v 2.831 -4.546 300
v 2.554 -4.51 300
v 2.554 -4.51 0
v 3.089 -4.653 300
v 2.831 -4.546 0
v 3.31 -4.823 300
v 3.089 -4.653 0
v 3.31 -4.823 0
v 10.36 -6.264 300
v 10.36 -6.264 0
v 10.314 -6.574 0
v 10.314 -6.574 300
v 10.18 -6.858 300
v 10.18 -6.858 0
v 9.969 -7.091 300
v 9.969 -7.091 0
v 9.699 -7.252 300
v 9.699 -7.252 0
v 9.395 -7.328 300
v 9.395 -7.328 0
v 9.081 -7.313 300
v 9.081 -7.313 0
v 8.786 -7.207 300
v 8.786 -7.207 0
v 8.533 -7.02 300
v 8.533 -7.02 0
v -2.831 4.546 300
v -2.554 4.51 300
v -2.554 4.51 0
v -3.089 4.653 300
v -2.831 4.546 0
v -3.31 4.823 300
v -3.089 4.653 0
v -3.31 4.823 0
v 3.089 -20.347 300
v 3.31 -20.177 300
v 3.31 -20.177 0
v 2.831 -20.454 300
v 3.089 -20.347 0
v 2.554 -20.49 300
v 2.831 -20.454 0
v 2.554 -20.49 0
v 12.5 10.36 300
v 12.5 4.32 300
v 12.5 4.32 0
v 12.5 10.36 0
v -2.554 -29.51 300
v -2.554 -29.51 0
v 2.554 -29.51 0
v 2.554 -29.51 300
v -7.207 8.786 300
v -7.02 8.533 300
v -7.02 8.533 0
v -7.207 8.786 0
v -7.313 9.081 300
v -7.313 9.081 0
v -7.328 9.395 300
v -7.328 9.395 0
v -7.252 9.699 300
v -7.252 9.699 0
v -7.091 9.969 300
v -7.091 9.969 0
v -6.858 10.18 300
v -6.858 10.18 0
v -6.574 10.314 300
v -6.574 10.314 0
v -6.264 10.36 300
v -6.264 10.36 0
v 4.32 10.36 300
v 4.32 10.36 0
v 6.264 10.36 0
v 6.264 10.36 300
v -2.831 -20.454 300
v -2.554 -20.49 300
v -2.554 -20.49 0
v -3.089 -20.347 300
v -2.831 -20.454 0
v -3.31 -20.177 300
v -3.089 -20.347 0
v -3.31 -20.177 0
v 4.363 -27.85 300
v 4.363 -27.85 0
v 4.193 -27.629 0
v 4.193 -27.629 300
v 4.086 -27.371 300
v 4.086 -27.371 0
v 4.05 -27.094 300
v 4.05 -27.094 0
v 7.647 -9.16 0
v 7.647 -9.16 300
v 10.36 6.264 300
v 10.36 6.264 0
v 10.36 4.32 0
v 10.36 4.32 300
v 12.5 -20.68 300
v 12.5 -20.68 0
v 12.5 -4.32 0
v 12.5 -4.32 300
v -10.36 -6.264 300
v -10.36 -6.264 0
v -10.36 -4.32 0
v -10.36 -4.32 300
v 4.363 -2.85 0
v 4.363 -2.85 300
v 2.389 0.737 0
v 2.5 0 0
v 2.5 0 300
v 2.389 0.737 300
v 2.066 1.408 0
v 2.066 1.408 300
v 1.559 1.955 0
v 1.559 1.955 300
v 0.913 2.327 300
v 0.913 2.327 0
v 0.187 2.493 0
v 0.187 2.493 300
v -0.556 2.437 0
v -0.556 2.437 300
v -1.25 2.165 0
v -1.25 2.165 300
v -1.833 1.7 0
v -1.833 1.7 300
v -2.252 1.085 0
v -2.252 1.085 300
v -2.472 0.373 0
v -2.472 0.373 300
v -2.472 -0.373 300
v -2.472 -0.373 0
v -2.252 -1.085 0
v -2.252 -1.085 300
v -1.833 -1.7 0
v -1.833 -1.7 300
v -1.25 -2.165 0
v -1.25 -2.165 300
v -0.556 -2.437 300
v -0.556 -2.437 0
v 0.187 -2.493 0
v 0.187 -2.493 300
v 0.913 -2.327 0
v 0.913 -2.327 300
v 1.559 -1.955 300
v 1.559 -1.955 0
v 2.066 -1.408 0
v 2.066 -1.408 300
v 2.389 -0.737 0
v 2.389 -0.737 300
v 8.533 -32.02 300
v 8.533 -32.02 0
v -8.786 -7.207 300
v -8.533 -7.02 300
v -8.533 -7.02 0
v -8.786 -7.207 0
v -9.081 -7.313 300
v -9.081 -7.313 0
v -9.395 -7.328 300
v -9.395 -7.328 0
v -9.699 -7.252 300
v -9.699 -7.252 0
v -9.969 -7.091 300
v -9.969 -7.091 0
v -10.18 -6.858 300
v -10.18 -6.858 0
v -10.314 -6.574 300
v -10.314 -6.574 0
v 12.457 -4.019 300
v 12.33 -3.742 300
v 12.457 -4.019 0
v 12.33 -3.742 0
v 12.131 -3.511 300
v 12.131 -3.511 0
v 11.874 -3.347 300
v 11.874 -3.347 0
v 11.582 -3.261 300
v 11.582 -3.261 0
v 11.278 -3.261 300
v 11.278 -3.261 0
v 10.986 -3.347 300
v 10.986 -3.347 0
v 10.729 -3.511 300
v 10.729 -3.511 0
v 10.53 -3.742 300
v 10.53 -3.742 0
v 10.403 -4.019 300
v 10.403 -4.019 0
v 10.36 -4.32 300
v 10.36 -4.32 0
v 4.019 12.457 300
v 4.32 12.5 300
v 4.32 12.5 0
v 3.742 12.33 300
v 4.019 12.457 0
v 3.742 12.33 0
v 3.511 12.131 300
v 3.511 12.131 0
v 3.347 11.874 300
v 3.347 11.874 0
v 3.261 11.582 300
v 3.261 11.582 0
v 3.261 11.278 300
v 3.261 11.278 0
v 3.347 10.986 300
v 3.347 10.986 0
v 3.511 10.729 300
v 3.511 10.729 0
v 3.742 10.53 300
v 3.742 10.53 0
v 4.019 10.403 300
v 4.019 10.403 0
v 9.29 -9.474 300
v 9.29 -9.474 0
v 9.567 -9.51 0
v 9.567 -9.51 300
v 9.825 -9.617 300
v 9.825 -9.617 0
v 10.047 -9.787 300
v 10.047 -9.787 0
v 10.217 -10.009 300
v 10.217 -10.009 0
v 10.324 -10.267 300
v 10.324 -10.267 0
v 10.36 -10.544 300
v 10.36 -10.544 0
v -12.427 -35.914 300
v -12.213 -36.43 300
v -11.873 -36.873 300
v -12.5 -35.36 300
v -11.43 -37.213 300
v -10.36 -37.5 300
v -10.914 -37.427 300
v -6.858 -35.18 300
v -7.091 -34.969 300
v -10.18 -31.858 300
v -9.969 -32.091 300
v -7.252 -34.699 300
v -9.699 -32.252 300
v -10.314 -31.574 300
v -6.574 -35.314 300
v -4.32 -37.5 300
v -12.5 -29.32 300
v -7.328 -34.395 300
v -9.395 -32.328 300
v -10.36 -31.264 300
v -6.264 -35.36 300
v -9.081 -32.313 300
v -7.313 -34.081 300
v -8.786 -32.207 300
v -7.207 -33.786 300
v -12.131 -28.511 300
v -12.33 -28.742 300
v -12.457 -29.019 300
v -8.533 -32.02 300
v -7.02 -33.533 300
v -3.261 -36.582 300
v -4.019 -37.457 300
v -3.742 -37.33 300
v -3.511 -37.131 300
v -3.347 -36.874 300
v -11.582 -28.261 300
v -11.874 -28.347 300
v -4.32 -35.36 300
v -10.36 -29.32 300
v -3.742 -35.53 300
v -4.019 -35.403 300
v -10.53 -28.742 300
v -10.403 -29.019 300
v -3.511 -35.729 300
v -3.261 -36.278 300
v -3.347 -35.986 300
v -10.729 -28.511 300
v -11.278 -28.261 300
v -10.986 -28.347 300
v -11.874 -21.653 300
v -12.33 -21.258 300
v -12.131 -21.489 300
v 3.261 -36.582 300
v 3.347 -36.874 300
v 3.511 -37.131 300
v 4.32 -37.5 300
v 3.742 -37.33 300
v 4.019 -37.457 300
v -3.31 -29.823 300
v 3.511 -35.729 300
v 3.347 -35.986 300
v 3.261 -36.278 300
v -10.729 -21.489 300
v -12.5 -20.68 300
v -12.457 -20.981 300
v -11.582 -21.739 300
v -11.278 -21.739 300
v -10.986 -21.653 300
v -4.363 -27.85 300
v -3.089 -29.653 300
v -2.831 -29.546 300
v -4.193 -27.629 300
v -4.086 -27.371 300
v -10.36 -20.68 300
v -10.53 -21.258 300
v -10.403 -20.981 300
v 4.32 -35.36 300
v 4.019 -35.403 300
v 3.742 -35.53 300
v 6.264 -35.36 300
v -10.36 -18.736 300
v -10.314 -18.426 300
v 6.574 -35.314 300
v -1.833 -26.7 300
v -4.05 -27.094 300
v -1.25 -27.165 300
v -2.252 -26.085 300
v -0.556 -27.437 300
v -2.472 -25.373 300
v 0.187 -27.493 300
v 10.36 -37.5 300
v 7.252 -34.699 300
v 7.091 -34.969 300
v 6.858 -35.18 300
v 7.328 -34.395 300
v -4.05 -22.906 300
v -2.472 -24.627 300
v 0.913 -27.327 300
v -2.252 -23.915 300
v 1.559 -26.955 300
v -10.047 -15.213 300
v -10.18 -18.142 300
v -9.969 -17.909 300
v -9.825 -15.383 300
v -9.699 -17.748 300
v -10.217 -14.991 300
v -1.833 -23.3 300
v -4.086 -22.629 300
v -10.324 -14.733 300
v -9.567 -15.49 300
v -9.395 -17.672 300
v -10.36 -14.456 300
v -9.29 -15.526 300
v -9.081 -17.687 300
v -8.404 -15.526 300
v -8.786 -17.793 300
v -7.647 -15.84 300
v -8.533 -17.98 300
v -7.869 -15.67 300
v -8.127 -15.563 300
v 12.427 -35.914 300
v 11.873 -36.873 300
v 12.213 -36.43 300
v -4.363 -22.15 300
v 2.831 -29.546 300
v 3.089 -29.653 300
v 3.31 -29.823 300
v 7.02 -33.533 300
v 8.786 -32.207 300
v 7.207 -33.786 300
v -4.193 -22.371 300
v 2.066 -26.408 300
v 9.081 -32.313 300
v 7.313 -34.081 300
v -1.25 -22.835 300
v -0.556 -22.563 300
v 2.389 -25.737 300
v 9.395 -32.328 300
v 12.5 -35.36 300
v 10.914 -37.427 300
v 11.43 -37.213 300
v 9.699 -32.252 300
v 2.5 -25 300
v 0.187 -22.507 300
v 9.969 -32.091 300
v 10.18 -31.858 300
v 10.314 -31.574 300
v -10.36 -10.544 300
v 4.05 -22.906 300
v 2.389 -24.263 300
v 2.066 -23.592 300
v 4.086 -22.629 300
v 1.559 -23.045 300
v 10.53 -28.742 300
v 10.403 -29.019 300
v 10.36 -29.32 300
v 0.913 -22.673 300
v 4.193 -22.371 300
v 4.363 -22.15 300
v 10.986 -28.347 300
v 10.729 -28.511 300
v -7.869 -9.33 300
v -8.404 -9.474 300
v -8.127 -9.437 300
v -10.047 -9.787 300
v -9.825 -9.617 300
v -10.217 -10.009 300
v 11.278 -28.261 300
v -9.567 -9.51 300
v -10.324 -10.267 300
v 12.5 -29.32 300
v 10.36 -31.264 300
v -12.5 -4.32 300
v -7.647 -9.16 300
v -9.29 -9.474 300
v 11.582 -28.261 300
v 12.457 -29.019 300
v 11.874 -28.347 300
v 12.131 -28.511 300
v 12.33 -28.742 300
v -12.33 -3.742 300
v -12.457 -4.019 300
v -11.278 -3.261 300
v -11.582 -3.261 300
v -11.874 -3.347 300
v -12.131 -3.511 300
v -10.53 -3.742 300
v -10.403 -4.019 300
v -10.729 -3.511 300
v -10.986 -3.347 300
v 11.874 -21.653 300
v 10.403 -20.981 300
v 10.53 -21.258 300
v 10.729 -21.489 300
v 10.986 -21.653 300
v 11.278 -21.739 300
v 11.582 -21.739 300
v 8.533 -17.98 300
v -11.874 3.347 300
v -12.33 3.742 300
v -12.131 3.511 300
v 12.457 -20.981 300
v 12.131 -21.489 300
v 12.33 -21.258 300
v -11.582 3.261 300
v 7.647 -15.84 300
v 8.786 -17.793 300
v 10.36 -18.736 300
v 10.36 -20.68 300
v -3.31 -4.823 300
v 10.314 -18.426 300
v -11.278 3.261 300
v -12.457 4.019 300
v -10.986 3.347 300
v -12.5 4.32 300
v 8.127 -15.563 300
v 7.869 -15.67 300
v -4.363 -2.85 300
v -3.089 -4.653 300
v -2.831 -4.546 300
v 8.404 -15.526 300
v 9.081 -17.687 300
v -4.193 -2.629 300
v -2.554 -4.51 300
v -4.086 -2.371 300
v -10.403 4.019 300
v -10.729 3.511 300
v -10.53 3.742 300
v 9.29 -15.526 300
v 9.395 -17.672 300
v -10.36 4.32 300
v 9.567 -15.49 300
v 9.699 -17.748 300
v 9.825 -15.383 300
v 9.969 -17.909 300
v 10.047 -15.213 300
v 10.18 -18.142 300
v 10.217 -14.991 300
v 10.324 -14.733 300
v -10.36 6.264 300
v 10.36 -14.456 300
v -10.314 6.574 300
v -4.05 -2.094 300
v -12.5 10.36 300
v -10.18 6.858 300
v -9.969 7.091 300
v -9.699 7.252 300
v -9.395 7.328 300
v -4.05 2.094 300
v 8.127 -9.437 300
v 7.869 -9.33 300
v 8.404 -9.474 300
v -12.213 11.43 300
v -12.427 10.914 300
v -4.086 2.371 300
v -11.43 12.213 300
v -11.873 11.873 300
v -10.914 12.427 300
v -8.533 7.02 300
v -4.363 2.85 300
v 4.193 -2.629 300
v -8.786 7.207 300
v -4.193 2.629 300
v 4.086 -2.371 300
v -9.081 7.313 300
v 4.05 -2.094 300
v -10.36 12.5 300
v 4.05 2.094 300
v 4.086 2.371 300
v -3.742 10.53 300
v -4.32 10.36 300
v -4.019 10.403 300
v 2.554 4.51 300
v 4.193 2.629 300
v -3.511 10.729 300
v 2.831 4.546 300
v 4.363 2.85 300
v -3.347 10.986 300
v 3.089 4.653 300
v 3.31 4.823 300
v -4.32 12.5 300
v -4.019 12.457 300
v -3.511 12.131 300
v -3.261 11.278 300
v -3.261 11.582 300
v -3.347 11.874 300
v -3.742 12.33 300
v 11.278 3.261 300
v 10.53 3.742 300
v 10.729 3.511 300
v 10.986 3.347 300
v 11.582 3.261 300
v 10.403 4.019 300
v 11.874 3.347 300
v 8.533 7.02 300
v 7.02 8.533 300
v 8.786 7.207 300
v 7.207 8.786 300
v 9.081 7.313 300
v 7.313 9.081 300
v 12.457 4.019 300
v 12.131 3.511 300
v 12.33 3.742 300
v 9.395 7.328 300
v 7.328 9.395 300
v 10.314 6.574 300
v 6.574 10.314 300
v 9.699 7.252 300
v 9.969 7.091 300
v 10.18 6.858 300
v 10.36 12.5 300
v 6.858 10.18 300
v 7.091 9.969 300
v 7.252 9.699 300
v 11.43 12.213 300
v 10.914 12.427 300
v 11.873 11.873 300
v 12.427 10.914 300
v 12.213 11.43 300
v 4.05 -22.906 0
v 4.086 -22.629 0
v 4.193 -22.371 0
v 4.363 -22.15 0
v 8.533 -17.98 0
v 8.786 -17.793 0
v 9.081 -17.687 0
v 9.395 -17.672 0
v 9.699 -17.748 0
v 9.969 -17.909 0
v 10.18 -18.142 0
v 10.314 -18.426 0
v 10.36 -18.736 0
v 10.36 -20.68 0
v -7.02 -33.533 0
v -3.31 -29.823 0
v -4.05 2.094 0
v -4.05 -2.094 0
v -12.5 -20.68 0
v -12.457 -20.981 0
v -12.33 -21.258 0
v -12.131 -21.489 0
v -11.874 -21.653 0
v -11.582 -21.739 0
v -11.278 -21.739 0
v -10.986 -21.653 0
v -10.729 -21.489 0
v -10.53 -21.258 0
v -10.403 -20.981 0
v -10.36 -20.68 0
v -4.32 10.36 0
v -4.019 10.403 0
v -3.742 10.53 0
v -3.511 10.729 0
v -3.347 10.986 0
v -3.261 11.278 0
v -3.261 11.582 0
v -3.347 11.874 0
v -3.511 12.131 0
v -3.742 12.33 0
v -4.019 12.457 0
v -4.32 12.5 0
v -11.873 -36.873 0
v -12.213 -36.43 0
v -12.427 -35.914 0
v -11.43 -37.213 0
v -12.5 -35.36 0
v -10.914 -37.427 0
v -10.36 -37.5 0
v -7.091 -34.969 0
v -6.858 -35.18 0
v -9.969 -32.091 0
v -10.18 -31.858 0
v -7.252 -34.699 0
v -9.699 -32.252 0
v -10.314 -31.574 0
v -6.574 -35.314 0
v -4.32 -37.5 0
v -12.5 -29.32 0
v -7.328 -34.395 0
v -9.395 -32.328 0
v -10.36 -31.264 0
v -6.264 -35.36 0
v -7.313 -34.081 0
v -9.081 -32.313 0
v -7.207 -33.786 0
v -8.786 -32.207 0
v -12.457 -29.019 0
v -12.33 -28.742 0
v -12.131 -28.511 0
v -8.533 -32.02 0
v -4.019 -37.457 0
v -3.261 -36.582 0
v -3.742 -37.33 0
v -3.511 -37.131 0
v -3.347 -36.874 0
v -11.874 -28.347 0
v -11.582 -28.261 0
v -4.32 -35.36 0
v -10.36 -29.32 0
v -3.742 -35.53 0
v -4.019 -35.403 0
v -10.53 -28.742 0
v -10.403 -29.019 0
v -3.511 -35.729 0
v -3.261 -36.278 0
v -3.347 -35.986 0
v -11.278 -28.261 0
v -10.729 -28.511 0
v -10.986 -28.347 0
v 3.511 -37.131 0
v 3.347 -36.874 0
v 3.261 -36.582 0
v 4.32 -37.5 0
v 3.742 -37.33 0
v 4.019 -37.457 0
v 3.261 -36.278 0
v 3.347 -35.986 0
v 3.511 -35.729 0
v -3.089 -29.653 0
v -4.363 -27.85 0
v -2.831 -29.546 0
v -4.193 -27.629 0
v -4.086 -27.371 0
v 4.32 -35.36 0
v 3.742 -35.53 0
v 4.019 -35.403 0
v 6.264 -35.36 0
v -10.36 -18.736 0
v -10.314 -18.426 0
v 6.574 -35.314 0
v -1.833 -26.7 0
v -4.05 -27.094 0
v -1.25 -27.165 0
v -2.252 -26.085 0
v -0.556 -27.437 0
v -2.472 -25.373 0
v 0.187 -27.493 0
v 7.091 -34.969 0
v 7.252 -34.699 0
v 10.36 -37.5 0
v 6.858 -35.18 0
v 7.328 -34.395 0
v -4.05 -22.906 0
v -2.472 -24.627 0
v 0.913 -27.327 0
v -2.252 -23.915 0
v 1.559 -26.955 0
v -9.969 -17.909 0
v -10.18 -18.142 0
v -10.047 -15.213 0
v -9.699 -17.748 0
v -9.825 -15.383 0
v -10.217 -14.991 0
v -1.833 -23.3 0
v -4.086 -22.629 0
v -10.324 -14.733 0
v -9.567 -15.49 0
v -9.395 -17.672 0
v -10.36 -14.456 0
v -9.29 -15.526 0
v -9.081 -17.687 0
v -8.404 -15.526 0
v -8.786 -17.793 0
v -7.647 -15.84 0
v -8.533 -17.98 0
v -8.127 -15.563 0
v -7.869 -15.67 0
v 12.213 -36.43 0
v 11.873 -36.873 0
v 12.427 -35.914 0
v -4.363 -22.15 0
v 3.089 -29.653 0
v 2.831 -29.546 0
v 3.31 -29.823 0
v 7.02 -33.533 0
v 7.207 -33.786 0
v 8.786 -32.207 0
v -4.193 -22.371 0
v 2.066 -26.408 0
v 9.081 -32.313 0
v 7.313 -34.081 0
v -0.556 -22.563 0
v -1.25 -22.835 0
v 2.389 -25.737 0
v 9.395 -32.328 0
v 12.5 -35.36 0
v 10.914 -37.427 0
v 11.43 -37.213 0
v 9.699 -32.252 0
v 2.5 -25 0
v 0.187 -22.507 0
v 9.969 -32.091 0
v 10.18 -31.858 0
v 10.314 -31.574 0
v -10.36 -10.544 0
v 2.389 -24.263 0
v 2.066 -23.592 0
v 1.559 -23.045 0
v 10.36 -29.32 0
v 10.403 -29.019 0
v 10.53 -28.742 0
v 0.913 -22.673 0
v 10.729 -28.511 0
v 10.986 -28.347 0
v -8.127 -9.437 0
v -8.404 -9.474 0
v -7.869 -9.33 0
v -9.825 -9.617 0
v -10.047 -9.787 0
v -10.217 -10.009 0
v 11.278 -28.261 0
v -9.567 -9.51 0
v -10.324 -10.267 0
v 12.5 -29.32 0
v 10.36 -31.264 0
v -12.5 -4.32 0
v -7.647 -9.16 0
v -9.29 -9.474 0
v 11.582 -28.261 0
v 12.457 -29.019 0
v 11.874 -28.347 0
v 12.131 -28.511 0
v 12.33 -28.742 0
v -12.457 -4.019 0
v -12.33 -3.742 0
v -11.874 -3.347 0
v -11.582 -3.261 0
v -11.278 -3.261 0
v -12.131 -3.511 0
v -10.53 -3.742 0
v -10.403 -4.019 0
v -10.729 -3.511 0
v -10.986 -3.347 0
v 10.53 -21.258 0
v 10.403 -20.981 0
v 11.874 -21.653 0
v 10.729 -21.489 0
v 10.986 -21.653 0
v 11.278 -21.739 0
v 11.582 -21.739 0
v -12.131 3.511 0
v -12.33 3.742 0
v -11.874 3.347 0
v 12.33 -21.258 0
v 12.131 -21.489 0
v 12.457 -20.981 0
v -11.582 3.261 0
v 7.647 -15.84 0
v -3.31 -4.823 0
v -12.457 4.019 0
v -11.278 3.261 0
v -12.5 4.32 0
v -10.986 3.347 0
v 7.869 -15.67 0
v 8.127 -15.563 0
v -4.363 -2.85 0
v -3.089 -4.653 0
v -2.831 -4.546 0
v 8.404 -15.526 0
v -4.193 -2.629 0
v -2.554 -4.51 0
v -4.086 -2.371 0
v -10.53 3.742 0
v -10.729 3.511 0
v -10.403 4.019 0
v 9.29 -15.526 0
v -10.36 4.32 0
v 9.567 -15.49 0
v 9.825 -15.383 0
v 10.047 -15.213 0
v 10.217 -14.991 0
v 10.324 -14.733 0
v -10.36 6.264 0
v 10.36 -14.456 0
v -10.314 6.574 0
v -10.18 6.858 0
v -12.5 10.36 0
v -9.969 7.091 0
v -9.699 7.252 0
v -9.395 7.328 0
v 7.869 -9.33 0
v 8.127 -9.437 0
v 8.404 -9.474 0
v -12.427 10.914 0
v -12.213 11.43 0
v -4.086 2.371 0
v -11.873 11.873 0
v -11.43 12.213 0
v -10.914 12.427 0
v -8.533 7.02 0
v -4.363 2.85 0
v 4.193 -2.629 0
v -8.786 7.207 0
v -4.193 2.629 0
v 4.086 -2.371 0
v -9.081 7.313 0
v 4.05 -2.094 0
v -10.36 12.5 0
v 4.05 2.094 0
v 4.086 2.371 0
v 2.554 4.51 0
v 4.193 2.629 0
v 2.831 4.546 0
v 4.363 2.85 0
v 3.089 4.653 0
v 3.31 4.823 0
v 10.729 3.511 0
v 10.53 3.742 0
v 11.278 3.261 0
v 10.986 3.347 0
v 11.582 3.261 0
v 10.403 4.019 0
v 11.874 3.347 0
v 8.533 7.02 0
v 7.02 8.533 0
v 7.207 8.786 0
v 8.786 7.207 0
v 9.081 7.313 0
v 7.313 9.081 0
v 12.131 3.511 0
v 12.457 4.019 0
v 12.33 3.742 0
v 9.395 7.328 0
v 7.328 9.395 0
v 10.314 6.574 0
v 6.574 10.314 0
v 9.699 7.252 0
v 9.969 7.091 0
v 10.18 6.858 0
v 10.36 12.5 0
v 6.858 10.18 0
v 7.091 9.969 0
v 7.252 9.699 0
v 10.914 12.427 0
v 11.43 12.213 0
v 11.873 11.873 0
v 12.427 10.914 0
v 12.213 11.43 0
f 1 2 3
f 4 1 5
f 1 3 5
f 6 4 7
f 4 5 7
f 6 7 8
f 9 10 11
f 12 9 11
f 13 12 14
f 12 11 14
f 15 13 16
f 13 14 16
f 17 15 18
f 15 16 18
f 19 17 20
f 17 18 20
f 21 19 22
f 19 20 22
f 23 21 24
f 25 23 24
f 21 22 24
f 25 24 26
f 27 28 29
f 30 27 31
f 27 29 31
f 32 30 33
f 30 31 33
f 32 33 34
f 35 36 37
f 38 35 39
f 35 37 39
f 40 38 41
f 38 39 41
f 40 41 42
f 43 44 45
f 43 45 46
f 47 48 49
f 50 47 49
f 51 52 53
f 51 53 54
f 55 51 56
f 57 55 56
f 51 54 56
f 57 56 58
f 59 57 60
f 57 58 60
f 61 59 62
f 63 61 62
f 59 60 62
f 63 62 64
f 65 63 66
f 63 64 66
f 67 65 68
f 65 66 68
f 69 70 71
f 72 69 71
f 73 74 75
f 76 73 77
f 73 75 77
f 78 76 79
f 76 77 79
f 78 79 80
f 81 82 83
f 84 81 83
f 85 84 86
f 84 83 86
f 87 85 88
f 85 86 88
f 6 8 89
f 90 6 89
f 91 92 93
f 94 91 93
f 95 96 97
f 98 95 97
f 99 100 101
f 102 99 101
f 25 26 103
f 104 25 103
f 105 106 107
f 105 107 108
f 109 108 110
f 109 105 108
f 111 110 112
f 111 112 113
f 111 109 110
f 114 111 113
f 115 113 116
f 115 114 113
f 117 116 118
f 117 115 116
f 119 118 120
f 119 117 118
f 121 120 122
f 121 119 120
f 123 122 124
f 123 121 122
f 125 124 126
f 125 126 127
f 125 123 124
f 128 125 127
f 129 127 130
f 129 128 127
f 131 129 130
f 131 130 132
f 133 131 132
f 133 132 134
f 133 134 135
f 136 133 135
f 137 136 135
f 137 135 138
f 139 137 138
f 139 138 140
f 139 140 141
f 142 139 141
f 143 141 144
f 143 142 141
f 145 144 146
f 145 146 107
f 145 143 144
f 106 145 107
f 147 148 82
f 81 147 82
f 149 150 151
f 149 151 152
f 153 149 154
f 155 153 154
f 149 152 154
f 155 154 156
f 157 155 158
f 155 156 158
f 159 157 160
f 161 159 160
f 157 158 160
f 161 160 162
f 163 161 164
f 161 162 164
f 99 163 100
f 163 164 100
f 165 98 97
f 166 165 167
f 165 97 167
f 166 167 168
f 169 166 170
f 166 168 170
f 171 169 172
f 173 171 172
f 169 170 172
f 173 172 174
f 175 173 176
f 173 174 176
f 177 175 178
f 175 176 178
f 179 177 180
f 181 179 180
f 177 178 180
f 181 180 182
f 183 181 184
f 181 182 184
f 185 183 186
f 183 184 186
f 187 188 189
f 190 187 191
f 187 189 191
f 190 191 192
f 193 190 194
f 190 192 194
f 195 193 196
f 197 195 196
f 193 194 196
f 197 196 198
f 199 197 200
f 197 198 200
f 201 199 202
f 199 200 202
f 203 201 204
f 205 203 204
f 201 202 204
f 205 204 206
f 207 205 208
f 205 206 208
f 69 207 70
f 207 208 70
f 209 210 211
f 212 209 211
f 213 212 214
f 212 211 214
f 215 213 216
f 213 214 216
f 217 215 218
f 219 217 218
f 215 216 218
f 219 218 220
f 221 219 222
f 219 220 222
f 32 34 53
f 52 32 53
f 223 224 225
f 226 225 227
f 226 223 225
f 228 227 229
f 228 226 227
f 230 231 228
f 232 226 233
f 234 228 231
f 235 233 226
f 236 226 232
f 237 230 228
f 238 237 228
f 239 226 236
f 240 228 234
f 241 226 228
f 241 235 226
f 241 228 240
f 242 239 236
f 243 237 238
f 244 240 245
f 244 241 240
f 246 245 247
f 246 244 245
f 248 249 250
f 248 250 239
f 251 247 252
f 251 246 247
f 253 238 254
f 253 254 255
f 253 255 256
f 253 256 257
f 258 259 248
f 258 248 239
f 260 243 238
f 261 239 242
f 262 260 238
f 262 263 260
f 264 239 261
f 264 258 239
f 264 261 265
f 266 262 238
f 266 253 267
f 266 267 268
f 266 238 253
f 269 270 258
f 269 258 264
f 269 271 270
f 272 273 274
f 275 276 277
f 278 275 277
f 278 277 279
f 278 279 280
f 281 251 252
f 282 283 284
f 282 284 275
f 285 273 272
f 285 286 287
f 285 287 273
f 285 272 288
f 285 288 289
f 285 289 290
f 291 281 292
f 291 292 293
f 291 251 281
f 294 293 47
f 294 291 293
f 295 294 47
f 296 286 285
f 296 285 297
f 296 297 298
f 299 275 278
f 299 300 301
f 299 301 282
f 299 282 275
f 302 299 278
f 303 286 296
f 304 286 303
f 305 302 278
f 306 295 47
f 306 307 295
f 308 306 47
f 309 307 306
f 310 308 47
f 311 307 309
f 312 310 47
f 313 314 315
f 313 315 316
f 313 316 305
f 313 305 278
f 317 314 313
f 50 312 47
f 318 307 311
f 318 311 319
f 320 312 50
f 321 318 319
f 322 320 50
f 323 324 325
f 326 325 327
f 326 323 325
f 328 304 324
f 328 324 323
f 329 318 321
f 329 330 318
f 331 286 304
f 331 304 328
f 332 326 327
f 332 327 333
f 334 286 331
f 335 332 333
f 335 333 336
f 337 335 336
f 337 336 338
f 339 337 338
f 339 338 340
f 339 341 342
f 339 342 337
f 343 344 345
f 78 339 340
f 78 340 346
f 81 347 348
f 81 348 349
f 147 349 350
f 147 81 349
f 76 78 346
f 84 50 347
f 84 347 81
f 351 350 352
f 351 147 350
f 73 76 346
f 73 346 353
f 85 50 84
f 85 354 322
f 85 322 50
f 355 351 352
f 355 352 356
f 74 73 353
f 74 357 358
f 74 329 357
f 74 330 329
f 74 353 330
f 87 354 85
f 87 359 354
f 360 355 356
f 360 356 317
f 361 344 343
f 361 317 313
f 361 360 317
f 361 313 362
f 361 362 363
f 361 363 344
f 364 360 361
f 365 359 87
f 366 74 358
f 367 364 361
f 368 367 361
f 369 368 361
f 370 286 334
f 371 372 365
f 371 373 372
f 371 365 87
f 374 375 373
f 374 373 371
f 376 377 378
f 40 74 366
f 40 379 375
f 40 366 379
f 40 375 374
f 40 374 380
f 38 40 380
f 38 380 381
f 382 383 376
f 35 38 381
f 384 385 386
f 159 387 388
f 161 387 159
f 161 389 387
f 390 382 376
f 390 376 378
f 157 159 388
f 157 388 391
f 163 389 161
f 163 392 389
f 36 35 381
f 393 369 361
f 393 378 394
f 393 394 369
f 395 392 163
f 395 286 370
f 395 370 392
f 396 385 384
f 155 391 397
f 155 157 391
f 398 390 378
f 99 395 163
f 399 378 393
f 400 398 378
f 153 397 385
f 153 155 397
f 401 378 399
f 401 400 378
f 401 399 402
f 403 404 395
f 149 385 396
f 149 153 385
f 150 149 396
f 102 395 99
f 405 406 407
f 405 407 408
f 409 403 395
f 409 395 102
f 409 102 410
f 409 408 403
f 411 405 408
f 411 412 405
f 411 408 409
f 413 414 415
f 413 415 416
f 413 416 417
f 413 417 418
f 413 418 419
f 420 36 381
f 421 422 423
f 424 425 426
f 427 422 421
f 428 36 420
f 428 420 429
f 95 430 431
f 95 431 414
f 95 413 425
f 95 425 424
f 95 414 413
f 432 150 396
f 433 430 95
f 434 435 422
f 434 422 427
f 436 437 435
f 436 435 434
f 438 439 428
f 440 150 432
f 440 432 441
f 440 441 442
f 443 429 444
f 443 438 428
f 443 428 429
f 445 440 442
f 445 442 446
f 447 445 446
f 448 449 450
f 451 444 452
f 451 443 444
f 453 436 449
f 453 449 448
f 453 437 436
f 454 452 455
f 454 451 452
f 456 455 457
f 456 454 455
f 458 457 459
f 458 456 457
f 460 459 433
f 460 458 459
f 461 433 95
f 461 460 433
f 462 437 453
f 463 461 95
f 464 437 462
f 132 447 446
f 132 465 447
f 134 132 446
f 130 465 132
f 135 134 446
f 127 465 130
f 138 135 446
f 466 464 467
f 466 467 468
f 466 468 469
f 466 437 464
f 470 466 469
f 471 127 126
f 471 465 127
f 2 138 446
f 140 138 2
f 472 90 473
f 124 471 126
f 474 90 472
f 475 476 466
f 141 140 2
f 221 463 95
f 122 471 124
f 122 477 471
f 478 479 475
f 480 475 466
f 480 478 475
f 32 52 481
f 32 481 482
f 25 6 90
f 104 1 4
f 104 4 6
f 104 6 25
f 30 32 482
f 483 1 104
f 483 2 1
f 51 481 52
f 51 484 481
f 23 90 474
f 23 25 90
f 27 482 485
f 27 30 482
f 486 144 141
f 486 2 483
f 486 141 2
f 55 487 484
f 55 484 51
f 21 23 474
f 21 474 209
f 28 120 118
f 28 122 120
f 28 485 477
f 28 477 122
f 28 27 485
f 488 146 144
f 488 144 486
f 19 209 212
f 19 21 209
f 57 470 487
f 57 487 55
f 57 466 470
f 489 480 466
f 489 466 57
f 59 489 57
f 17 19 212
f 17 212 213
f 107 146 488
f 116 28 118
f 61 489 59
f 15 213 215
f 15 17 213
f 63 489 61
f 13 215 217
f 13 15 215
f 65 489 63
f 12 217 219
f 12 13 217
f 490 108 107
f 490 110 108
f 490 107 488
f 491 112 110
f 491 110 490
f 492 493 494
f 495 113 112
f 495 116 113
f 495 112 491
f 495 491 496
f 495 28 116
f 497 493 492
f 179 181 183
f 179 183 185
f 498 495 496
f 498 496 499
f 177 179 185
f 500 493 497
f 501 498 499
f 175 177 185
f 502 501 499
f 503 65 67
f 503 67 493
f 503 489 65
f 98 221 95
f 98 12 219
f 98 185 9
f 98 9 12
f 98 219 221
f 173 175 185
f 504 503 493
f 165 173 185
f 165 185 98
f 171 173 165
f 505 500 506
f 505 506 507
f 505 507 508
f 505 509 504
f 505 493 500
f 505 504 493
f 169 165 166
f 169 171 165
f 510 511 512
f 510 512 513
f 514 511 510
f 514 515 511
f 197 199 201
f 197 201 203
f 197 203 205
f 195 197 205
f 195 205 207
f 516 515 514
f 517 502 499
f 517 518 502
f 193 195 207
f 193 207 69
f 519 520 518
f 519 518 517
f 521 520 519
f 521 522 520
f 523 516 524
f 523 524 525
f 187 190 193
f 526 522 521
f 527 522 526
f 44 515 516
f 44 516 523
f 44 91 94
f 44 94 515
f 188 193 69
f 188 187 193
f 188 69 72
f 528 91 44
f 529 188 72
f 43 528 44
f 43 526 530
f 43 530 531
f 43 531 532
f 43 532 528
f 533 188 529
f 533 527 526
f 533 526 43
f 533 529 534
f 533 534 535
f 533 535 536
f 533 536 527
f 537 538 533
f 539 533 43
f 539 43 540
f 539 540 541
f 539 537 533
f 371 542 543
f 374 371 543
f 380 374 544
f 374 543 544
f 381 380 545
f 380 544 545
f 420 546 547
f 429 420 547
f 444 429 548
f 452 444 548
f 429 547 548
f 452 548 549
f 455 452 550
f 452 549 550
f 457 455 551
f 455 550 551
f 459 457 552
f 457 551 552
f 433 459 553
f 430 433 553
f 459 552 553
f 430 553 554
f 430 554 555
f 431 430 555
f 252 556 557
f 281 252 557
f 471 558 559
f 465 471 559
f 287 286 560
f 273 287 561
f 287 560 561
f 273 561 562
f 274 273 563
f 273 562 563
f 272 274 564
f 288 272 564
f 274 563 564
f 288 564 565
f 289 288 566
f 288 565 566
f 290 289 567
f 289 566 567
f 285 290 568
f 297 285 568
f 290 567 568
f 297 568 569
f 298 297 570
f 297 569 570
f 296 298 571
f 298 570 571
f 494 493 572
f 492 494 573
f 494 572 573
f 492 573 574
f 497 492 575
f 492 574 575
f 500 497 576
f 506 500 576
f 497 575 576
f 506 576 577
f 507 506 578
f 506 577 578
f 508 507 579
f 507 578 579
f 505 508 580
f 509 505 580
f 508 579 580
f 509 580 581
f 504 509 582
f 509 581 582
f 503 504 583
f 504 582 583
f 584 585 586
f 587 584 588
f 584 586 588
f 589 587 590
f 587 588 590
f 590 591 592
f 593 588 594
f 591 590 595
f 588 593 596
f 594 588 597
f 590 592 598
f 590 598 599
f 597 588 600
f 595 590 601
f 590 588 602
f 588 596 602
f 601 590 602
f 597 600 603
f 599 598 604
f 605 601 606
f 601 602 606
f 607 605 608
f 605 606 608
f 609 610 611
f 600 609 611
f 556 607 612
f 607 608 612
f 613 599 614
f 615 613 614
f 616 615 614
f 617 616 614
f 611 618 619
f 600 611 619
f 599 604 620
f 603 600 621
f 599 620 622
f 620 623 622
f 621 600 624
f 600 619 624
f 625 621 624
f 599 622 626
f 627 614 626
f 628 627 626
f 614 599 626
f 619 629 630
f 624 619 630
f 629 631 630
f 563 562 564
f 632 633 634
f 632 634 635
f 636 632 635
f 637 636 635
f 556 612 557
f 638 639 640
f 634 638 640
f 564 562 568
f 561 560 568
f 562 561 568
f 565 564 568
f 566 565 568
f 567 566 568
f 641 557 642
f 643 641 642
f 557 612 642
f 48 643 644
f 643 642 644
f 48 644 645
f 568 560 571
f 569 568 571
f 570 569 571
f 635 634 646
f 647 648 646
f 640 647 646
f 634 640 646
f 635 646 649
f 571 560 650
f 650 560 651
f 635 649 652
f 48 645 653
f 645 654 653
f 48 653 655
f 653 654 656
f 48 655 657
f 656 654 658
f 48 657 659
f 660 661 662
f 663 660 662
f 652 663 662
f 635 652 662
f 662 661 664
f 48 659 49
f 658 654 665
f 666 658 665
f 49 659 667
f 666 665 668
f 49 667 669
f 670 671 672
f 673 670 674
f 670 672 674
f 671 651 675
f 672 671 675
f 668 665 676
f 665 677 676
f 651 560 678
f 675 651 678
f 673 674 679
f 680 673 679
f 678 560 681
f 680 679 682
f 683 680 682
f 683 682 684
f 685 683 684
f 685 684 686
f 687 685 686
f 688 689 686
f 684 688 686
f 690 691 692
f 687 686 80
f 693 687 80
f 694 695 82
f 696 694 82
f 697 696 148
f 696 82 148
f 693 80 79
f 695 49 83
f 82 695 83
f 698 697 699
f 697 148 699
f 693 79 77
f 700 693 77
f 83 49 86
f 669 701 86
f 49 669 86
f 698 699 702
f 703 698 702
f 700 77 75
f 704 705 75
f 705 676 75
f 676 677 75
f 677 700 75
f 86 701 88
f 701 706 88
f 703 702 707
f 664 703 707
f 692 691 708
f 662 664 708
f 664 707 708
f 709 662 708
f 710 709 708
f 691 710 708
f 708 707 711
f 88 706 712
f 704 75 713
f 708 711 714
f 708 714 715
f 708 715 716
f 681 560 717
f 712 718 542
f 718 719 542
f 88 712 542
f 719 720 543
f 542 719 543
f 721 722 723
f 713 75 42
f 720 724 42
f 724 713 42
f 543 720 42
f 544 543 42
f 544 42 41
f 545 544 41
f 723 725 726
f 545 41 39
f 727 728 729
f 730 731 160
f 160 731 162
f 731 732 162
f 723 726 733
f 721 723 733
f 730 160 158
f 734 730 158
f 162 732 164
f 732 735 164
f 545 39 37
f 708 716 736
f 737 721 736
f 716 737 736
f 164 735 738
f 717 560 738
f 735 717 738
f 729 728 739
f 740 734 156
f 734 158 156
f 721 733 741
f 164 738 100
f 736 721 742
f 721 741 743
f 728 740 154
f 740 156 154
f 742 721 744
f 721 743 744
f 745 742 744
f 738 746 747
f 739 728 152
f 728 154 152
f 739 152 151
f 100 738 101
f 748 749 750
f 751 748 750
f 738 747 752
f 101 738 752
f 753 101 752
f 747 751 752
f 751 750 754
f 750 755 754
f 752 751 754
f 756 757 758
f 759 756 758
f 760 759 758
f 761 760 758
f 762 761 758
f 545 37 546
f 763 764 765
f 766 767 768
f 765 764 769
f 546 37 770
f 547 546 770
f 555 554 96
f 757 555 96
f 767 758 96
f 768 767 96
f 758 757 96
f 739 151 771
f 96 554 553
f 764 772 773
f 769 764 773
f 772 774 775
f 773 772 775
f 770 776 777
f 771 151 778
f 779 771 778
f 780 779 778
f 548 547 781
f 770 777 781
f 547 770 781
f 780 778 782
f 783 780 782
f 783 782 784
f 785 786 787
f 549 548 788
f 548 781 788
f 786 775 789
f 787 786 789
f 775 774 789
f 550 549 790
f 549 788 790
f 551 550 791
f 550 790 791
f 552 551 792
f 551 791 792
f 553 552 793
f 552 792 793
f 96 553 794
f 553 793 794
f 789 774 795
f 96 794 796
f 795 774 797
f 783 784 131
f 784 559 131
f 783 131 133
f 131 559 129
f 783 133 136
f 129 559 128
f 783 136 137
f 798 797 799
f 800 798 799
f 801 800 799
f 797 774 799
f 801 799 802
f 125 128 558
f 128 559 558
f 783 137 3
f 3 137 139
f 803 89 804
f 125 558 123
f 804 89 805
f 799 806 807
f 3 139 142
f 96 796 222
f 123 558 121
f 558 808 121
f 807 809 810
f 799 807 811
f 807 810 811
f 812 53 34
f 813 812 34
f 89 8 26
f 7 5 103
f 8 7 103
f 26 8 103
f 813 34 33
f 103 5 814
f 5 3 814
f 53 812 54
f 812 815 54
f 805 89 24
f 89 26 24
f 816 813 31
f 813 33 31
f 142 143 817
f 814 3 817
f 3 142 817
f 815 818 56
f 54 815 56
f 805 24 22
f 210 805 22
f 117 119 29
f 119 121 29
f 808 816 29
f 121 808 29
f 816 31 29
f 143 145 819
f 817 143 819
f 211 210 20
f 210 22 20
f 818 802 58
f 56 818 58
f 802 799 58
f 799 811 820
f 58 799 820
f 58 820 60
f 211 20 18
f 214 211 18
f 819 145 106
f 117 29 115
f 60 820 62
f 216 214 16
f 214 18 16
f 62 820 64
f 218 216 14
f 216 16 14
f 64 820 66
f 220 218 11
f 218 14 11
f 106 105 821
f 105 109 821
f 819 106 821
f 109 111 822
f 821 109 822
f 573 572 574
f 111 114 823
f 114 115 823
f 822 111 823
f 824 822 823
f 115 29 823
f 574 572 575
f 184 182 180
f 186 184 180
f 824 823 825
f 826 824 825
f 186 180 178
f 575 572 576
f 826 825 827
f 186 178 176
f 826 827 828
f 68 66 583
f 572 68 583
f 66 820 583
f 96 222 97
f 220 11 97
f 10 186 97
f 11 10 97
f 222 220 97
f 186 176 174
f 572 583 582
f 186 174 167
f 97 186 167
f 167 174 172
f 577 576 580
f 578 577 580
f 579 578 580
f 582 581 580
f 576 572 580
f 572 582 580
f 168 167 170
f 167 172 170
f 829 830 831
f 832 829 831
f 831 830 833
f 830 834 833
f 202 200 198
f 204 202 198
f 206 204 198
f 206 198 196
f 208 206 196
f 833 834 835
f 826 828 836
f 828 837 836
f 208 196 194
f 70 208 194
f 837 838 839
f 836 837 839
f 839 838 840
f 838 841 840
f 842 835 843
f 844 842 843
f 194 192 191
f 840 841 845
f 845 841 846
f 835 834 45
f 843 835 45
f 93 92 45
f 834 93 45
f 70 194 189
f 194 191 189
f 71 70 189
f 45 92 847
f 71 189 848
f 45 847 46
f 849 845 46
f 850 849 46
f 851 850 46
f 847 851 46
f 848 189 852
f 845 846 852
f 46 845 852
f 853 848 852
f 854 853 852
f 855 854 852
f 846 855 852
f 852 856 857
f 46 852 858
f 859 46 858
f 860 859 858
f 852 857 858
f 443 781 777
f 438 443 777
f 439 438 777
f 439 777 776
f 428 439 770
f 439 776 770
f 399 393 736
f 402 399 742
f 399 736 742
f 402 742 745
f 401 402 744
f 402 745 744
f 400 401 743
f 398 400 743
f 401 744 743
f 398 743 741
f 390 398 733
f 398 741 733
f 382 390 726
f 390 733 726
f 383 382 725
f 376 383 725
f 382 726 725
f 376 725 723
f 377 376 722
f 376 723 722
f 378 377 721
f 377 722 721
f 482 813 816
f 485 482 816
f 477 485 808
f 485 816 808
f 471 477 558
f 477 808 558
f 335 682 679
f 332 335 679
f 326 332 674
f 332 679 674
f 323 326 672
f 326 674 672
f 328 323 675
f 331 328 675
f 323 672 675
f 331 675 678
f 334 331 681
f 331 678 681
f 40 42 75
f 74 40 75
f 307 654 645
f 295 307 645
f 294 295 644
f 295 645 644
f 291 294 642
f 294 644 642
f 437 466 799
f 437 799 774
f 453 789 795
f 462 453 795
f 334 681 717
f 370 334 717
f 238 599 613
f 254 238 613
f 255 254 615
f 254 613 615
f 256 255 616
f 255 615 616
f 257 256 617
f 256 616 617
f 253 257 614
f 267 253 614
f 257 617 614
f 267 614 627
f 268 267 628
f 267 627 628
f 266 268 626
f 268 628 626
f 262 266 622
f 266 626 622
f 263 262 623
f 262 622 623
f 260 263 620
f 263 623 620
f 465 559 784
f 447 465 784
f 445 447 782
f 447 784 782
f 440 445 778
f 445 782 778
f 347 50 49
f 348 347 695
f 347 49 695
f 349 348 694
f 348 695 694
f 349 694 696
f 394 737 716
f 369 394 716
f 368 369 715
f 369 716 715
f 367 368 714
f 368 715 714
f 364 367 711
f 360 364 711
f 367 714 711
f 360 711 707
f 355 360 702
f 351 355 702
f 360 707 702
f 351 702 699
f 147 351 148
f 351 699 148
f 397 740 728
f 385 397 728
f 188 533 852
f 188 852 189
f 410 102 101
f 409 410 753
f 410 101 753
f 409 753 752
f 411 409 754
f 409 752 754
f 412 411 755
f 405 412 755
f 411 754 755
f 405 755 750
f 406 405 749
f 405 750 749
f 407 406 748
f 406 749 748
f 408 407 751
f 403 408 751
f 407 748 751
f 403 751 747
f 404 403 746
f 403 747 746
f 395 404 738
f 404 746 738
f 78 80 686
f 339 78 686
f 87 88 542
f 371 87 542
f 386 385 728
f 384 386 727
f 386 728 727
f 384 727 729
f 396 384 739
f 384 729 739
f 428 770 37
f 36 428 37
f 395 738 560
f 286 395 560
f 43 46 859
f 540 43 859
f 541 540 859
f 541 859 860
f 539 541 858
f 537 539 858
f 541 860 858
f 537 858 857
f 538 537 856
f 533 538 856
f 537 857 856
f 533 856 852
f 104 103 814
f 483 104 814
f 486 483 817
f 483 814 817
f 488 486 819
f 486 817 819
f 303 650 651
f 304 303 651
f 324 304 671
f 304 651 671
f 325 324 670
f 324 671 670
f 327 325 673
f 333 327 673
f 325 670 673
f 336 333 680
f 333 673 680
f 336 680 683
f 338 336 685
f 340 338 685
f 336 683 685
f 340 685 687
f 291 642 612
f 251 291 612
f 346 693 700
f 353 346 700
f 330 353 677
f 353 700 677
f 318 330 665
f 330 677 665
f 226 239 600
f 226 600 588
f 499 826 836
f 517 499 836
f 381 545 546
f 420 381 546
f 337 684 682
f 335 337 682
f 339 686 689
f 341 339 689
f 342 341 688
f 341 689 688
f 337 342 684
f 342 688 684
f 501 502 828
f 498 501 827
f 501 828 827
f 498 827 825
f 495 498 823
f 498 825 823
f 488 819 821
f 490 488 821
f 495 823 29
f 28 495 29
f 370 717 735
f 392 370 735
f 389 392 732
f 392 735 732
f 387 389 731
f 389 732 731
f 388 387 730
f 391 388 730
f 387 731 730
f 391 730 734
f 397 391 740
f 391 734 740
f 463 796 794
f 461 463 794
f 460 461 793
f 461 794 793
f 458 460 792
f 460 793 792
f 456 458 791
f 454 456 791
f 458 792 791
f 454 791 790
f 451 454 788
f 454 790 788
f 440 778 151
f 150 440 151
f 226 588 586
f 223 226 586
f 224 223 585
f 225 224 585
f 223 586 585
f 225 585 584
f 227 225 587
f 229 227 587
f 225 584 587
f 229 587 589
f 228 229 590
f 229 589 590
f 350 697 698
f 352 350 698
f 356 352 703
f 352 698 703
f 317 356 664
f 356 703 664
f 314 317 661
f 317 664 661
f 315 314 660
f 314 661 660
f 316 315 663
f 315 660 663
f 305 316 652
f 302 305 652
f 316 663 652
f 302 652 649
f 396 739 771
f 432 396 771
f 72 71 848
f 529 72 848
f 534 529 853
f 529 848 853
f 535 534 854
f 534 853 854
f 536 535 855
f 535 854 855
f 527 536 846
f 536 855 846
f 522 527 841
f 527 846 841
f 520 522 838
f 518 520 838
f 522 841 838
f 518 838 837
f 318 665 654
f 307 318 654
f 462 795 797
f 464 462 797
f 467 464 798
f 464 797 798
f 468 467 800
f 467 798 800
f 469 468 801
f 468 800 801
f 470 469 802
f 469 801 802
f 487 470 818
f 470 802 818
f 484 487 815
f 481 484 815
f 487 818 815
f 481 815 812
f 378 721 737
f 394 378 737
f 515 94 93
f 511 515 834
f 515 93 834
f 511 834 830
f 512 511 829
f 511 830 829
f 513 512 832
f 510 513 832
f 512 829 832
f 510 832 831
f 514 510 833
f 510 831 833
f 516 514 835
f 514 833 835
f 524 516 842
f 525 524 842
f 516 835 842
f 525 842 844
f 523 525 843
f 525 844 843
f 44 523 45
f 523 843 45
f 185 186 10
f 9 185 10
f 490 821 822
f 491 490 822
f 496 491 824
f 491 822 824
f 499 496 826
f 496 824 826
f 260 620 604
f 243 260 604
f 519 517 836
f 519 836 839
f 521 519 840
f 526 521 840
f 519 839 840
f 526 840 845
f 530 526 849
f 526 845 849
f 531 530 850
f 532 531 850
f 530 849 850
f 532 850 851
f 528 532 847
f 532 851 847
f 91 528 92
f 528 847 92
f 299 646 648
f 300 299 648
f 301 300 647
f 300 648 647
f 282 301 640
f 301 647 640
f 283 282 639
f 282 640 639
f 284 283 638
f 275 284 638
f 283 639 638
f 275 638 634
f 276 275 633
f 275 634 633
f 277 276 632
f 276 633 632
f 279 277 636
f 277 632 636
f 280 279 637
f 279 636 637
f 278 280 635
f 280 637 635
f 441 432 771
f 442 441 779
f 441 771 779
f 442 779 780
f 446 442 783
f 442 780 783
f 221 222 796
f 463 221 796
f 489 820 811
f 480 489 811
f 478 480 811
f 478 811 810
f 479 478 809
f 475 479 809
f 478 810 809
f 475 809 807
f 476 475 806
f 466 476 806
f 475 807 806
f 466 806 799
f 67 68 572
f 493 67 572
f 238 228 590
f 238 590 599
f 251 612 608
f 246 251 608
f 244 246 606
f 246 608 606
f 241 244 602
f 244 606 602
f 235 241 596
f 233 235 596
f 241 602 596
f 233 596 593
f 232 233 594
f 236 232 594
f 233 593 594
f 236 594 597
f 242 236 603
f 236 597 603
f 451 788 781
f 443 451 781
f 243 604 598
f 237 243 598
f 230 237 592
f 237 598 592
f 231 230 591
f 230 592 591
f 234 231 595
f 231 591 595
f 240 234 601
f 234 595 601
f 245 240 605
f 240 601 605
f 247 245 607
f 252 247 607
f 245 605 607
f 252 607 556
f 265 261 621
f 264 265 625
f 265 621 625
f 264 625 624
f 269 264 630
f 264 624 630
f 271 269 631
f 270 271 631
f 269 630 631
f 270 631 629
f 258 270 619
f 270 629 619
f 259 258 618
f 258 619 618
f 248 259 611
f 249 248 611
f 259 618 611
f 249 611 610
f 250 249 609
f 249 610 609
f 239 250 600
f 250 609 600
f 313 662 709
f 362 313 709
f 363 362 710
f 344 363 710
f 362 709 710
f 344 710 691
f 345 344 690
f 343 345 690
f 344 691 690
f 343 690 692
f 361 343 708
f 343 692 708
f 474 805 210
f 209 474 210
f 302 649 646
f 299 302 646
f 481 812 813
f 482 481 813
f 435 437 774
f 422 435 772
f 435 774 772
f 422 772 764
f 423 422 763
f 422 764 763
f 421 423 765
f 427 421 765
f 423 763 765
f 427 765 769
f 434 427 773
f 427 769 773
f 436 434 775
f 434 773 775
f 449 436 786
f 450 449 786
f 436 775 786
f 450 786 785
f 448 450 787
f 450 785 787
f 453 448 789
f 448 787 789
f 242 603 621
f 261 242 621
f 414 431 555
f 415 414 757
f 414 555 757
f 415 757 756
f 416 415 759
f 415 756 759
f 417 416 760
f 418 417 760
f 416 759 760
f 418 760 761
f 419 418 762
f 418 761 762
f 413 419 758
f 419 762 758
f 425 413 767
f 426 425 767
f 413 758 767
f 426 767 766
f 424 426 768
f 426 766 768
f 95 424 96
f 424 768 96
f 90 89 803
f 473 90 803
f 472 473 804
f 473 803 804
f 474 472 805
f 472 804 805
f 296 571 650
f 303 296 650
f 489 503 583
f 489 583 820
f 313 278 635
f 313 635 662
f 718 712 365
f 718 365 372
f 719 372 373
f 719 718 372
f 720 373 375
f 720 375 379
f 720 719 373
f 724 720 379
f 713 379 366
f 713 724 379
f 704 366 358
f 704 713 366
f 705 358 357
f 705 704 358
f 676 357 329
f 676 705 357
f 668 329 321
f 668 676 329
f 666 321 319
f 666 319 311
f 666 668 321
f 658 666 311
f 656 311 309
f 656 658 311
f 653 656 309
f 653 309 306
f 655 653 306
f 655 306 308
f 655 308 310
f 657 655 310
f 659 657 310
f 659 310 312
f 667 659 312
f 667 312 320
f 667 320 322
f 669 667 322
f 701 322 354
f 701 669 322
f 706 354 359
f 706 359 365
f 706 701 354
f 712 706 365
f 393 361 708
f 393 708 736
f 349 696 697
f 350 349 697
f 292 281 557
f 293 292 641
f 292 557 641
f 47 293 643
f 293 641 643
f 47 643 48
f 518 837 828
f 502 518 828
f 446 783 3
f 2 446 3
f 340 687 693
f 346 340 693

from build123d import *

# Parameters (mm, degrees)
F0_R     = 2.5
F1_DEPTH = 300


with BuildPart() as f1:
    # F0 (on Top) → F1 (new body)
    with BuildSketch(Plane.XY):
        with BuildLine():
            ThreePointArc((-10.36, 12.5), (-11.873209, 11.873209), (-12.5, 10.36))
            Line((-12.5, 10.36), (-12.5, 4.32))
            ThreePointArc((-12.5, 4.32), (-11.43, 3.25), (-10.36, 4.32))
            Line((-10.36, 4.32), (-10.36, 6.263583))
            ThreePointArc((-10.36, 6.263583), (-9.699471, 7.252134), (-8.533396, 7.020187))
            Line((-8.533396, 7.020187), (-4.363396, 2.850187))
            ThreePointArc((-4.363396, 2.850187), (-4.131449, 2.503054), (-4.05, 2.093583))
            Line((-4.05, 2.093583), (-4.05, 0))
            Line((-4.05, 0), (-4.05, -2.093583))
            ThreePointArc((-4.05, -2.093583), (-4.131449, -2.503054), (-4.363396, -2.850187))
            Line((-4.363396, -2.850187), (-8.533396, -7.020187))
            ThreePointArc((-8.533396, -7.020187), (-9.699471, -7.252134), (-10.36, -6.263583))
            Line((-10.36, -6.263583), (-10.36, -4.32))
            ThreePointArc((-10.36, -4.32), (-11.43, -3.25), (-12.5, -4.32))
            Line((-12.5, -4.32), (-12.5, -12.5))
            Line((-12.5, -12.5), (-12.5, -20.68))
            ThreePointArc((-12.5, -20.68), (-11.43, -21.75), (-10.36, -20.68))
            Line((-10.36, -20.68), (-10.36, -18.736417))
            ThreePointArc((-10.36, -18.736417), (-9.699471, -17.747866), (-8.533396, -17.979813))
            Line((-8.533396, -17.979813), (-4.363396, -22.149813))
            ThreePointArc((-4.363396, -22.149813), (-4.131449, -22.496946), (-4.05, -22.906417))
            Line((-4.05, -22.906417), (-4.05, -25))
            Line((-4.05, -25), (-4.05, -27.093583))
            ThreePointArc((-4.05, -27.093583), (-4.131449, -27.503054), (-4.363396, -27.850187))
            Line((-4.363396, -27.850187), (-8.533396, -32.020187))
            ThreePointArc((-8.533396, -32.020187), (-9.699471, -32.252134), (-10.36, -31.263583))
            Line((-10.36, -31.263583), (-10.36, -29.32))
            ThreePointArc((-10.36, -29.32), (-11.43, -28.25), (-12.5, -29.32))
            Line((-12.5, -29.32), (-12.5, -35.36))
            ThreePointArc((-12.5, -35.36), (-11.873209, -36.873209), (-10.36, -37.5))
            Line((-10.36, -37.5), (-4.32, -37.5))
            ThreePointArc((-4.32, -37.5), (-3.25, -36.43), (-4.32, -35.36))
            Line((-4.32, -35.36), (-6.263583, -35.36))
            ThreePointArc((-6.263583, -35.36), (-7.252134, -34.699471), (-7.020187, -33.533396))
            Line((-7.020187, -33.533396), (-3.310187, -29.823396))
            ThreePointArc((-3.310187, -29.823396), (-2.963054, -29.591449), (-2.553583, -29.51))
            Line((-2.553583, -29.51), (0, -29.51))
            Line((0, -29.51), (2.553583, -29.51))
            ThreePointArc((2.553583, -29.51), (2.963054, -29.591449), (3.310187, -29.823396))
            Line((3.310187, -29.823396), (7.020187, -33.533396))
            ThreePointArc((7.020187, -33.533396), (7.252134, -34.699471), (6.263583, -35.36))
            Line((6.263583, -35.36), (4.32, -35.36))
            ThreePointArc((4.32, -35.36), (3.25, -36.43), (4.32, -37.5))
            Line((4.32, -37.5), (10.36, -37.5))
            ThreePointArc((10.36, -37.5), (11.873209, -36.873209), (12.5, -35.36))
            Line((12.5, -35.36), (12.5, -29.32))
            ThreePointArc((12.5, -29.32), (11.43, -28.25), (10.36, -29.32))
            Line((10.36, -29.32), (10.36, -31.263583))
            ThreePointArc((10.36, -31.263583), (9.699471, -32.252134), (8.533396, -32.020187))
            Line((8.533396, -32.020187), (4.363396, -27.850187))
            ThreePointArc((4.363396, -27.850187), (4.131449, -27.503054), (4.05, -27.093583))
            Line((4.05, -27.093583), (4.05, -25))
            Line((4.05, -25), (4.05, -22.906417))
            ThreePointArc((4.05, -22.906417), (4.131449, -22.496946), (4.363396, -22.149813))
            Line((4.363396, -22.149813), (8.533396, -17.979813))
            ThreePointArc((8.533396, -17.979813), (9.699471, -17.747866), (10.36, -18.736417))
            Line((10.36, -18.736417), (10.36, -20.68))
            ThreePointArc((10.36, -20.68), (11.43, -21.75), (12.5, -20.68))
            Line((12.5, -20.68), (12.5, -12.5))
            Line((12.5, -12.5), (12.5, -4.32))
            ThreePointArc((12.5, -4.32), (11.43, -3.25), (10.36, -4.32))
            Line((10.36, -4.32), (10.36, -6.263583))
            ThreePointArc((10.36, -6.263583), (9.699471, -7.252134), (8.533396, -7.020187))
            Line((8.533396, -7.020187), (4.363396, -2.850187))
            ThreePointArc((4.363396, -2.850187), (4.131449, -2.503054), (4.05, -2.093583))
            Line((4.05, -2.093583), (4.05, 0))
            Line((4.05, 0), (4.05, 2.093583))
            ThreePointArc((4.05, 2.093583), (4.131449, 2.503054), (4.363396, 2.850187))
            Line((4.363396, 2.850187), (8.533396, 7.020187))
            ThreePointArc((8.533396, 7.020187), (9.699471, 7.252134), (10.36, 6.263583))
            Line((10.36, 6.263583), (10.36, 4.32))
            ThreePointArc((10.36, 4.32), (11.43, 3.25), (12.5, 4.32))
            Line((12.5, 4.32), (12.5, 10.36))
            ThreePointArc((12.5, 10.36), (11.873209, 11.873209), (10.36, 12.5))
            Line((10.36, 12.5), (4.32, 12.5))
            ThreePointArc((4.32, 12.5), (3.25, 11.43), (4.32, 10.36))
            Line((4.32, 10.36), (6.263583, 10.36))
            ThreePointArc((6.263583, 10.36), (7.252134, 9.699471), (7.020187, 8.533396))
            Line((7.020187, 8.533396), (3.310187, 4.823396))
            ThreePointArc((3.310187, 4.823396), (2.963054, 4.591449), (2.553583, 4.51))
            Line((2.553583, 4.51), (0, 4.51))
            Line((0, 4.51), (-2.553583, 4.51))
            ThreePointArc((-2.553583, 4.51), (-2.963054, 4.591449), (-3.310187, 4.823396))
            Line((-3.310187, 4.823396), (-7.020187, 8.533396))
            ThreePointArc((-7.020187, 8.533396), (-7.252134, 9.699471), (-6.263583, 10.36))
            Line((-6.263583, 10.36), (-4.32, 10.36))
            ThreePointArc((-4.32, 10.36), (-3.25, 11.43), (-4.32, 12.5))
            Line((-4.32, 12.5), (-10.36, 12.5))
        make_face()
        with Locations((0, -25)):
            Circle(F0_R, mode=Mode.SUBTRACT)
        with BuildLine():
            Line((-2.553583, -4.51), (0, -4.51))
            Line((0, -4.51), (2.553583, -4.51))
            ThreePointArc((2.553583, -4.51), (2.963054, -4.591449), (3.310187, -4.823396))
            Line((3.310187, -4.823396), (7.646979, -9.160187))
            ThreePointArc((7.646979, -9.160187), (7.994112, -9.392134), (8.403583, -9.473583))
            Line((8.403583, -9.473583), (9.29, -9.473583))
            ThreePointArc((9.29, -9.473583), (10.046604, -9.786979), (10.36, -10.543583))
            Line((10.36, -10.543583), (10.36, -12.5))
            Line((10.36, -12.5), (10.36, -14.456417))
            ThreePointArc((10.36, -14.456417), (10.046604, -15.213021), (9.29, -15.526417))
            Line((9.29, -15.526417), (8.403583, -15.526417))
            ThreePointArc((8.403583, -15.526417), (7.994112, -15.607866), (7.646979, -15.839813))
            Line((7.646979, -15.839813), (3.310187, -20.176604))
            ThreePointArc((3.310187, -20.176604), (2.963054, -20.408551), (2.553583, -20.49))
            Line((2.553583, -20.49), (0, -20.49))
            Line((0, -20.49), (-2.553583, -20.49))
            ThreePointArc((-2.553583, -20.49), (-2.963054, -20.408551), (-3.310187, -20.176604))
            Line((-3.310187, -20.176604), (-7.646979, -15.839813))
            ThreePointArc((-7.646979, -15.839813), (-7.994112, -15.607866), (-8.403583, -15.526417))
            Line((-8.403583, -15.526417), (-9.29, -15.526417))
            ThreePointArc((-9.29, -15.526417), (-10.046604, -15.213021), (-10.36, -14.456417))
            Line((-10.36, -14.456417), (-10.36, -12.5))
            Line((-10.36, -12.5), (-10.36, -10.543583))
            ThreePointArc((-10.36, -10.543583), (-10.046604, -9.786979), (-9.29, -9.473583))
            Line((-9.29, -9.473583), (-8.403583, -9.473583))
            ThreePointArc((-8.403583, -9.473583), (-7.994112, -9.392134), (-7.646979, -9.160187))
            Line((-7.646979, -9.160187), (-3.310187, -4.823396))
            ThreePointArc((-3.310187, -4.823396), (-2.963054, -4.591449), (-2.553583, -4.51))
        make_face(mode=Mode.SUBTRACT)
        Circle(F0_R, mode=Mode.SUBTRACT)
    extrude(amount=F1_DEPTH)


solid = f1.part
